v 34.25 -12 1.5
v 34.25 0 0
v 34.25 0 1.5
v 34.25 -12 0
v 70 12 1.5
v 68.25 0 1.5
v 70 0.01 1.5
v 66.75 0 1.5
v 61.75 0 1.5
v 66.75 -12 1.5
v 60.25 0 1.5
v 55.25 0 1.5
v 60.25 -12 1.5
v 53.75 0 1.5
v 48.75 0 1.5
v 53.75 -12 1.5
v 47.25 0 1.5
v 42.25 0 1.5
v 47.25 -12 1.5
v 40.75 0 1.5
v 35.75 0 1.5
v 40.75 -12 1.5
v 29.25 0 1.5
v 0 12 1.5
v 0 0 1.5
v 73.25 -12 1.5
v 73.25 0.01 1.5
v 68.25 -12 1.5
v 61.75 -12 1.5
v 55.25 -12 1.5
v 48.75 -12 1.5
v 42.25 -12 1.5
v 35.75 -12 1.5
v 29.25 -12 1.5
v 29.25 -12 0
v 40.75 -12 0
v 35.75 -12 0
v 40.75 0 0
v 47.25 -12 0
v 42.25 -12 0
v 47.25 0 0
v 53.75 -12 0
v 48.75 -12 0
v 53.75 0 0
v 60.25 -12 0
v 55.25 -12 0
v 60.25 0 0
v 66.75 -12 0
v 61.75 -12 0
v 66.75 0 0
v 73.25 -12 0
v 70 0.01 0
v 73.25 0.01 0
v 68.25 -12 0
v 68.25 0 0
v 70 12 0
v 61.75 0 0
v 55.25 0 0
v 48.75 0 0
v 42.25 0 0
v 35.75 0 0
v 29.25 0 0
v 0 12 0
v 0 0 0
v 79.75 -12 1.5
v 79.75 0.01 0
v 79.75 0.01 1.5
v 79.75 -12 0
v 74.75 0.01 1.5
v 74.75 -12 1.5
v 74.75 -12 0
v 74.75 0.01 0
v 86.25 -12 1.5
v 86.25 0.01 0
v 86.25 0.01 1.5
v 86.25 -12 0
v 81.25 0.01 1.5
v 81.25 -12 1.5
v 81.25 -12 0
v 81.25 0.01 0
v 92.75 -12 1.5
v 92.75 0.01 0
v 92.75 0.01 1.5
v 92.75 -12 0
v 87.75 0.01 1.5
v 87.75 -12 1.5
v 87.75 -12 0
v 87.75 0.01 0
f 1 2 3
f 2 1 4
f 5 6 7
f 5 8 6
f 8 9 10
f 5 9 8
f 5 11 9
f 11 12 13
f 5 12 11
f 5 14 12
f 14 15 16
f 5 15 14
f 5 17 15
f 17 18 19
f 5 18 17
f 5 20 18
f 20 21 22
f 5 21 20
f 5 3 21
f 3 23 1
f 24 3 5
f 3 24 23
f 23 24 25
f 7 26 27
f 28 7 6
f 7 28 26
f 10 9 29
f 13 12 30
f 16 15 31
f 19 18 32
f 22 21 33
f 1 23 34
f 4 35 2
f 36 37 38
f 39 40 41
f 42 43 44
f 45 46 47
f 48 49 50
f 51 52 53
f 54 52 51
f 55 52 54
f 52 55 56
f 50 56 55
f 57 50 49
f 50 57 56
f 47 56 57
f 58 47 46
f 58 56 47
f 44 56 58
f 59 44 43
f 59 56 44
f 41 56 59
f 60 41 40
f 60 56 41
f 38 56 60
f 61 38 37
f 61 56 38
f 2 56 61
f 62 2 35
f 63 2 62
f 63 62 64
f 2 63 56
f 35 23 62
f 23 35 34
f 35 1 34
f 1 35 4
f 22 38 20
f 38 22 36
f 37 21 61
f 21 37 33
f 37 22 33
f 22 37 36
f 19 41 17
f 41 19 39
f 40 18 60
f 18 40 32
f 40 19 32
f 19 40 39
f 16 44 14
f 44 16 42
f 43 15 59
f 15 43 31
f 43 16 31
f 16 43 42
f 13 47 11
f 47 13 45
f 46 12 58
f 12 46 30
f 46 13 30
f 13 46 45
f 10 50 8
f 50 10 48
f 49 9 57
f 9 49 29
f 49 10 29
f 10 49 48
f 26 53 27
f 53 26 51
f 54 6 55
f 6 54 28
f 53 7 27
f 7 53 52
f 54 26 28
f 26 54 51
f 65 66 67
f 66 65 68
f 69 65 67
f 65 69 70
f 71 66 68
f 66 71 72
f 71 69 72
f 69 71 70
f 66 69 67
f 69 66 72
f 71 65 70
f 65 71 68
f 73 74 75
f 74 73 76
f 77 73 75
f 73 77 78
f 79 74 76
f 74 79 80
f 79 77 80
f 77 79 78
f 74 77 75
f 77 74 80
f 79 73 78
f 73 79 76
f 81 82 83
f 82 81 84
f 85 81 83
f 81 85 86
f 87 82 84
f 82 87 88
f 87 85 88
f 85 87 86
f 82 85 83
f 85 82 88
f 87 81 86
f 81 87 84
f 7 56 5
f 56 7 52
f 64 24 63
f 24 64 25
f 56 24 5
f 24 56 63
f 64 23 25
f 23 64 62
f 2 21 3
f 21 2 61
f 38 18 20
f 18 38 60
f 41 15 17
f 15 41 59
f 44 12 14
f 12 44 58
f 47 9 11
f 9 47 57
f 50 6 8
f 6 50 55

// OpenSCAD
// 10-well agarose gel comb - printed flat on the bed
// Units: mm

$fn = 64;

// ---- Parameters ----
plate_t     = 1.5;   // comb thickness (Z)
spine_len   = 70;    // spine length (X)
spine_w     = 12;    // spine width (Y)
n_teeth     = 10;    // number of teeth / wells
tooth_w     = 5.0;   // tooth width (X)
tooth_len   = 12;    // tooth length (Y), hanging in -Y
tooth_gap   = 1.5;   // gap between neighbouring teeth (X)
overlap     = 0.01;  // small overlap so teeth fuse into spine

// ---- Derived ----
row_w   = n_teeth * tooth_w + (n_teeth - 1) * tooth_gap; // total width of tooth row
total_y = spine_w + tooth_len;                          // overall Y extent
y0      = -total_y / 2;                                  // bottom (tooth tips) Y

// ---- Model ----
union() {
    // Spine (back bar)
    translate([0, y0 + tooth_len, 0])
        cube([spine_len, spine_w, plate_t]);

    // Teeth, row centred on spine in X
    for (i = [0 : n_teeth - 1])
        translate([(row_w / 2) - tooth_w / 2 + i * (tooth_w + tooth_gap), y0, 0])
            cube([tooth_w, tooth_len + overlap, plate_t]);
}
